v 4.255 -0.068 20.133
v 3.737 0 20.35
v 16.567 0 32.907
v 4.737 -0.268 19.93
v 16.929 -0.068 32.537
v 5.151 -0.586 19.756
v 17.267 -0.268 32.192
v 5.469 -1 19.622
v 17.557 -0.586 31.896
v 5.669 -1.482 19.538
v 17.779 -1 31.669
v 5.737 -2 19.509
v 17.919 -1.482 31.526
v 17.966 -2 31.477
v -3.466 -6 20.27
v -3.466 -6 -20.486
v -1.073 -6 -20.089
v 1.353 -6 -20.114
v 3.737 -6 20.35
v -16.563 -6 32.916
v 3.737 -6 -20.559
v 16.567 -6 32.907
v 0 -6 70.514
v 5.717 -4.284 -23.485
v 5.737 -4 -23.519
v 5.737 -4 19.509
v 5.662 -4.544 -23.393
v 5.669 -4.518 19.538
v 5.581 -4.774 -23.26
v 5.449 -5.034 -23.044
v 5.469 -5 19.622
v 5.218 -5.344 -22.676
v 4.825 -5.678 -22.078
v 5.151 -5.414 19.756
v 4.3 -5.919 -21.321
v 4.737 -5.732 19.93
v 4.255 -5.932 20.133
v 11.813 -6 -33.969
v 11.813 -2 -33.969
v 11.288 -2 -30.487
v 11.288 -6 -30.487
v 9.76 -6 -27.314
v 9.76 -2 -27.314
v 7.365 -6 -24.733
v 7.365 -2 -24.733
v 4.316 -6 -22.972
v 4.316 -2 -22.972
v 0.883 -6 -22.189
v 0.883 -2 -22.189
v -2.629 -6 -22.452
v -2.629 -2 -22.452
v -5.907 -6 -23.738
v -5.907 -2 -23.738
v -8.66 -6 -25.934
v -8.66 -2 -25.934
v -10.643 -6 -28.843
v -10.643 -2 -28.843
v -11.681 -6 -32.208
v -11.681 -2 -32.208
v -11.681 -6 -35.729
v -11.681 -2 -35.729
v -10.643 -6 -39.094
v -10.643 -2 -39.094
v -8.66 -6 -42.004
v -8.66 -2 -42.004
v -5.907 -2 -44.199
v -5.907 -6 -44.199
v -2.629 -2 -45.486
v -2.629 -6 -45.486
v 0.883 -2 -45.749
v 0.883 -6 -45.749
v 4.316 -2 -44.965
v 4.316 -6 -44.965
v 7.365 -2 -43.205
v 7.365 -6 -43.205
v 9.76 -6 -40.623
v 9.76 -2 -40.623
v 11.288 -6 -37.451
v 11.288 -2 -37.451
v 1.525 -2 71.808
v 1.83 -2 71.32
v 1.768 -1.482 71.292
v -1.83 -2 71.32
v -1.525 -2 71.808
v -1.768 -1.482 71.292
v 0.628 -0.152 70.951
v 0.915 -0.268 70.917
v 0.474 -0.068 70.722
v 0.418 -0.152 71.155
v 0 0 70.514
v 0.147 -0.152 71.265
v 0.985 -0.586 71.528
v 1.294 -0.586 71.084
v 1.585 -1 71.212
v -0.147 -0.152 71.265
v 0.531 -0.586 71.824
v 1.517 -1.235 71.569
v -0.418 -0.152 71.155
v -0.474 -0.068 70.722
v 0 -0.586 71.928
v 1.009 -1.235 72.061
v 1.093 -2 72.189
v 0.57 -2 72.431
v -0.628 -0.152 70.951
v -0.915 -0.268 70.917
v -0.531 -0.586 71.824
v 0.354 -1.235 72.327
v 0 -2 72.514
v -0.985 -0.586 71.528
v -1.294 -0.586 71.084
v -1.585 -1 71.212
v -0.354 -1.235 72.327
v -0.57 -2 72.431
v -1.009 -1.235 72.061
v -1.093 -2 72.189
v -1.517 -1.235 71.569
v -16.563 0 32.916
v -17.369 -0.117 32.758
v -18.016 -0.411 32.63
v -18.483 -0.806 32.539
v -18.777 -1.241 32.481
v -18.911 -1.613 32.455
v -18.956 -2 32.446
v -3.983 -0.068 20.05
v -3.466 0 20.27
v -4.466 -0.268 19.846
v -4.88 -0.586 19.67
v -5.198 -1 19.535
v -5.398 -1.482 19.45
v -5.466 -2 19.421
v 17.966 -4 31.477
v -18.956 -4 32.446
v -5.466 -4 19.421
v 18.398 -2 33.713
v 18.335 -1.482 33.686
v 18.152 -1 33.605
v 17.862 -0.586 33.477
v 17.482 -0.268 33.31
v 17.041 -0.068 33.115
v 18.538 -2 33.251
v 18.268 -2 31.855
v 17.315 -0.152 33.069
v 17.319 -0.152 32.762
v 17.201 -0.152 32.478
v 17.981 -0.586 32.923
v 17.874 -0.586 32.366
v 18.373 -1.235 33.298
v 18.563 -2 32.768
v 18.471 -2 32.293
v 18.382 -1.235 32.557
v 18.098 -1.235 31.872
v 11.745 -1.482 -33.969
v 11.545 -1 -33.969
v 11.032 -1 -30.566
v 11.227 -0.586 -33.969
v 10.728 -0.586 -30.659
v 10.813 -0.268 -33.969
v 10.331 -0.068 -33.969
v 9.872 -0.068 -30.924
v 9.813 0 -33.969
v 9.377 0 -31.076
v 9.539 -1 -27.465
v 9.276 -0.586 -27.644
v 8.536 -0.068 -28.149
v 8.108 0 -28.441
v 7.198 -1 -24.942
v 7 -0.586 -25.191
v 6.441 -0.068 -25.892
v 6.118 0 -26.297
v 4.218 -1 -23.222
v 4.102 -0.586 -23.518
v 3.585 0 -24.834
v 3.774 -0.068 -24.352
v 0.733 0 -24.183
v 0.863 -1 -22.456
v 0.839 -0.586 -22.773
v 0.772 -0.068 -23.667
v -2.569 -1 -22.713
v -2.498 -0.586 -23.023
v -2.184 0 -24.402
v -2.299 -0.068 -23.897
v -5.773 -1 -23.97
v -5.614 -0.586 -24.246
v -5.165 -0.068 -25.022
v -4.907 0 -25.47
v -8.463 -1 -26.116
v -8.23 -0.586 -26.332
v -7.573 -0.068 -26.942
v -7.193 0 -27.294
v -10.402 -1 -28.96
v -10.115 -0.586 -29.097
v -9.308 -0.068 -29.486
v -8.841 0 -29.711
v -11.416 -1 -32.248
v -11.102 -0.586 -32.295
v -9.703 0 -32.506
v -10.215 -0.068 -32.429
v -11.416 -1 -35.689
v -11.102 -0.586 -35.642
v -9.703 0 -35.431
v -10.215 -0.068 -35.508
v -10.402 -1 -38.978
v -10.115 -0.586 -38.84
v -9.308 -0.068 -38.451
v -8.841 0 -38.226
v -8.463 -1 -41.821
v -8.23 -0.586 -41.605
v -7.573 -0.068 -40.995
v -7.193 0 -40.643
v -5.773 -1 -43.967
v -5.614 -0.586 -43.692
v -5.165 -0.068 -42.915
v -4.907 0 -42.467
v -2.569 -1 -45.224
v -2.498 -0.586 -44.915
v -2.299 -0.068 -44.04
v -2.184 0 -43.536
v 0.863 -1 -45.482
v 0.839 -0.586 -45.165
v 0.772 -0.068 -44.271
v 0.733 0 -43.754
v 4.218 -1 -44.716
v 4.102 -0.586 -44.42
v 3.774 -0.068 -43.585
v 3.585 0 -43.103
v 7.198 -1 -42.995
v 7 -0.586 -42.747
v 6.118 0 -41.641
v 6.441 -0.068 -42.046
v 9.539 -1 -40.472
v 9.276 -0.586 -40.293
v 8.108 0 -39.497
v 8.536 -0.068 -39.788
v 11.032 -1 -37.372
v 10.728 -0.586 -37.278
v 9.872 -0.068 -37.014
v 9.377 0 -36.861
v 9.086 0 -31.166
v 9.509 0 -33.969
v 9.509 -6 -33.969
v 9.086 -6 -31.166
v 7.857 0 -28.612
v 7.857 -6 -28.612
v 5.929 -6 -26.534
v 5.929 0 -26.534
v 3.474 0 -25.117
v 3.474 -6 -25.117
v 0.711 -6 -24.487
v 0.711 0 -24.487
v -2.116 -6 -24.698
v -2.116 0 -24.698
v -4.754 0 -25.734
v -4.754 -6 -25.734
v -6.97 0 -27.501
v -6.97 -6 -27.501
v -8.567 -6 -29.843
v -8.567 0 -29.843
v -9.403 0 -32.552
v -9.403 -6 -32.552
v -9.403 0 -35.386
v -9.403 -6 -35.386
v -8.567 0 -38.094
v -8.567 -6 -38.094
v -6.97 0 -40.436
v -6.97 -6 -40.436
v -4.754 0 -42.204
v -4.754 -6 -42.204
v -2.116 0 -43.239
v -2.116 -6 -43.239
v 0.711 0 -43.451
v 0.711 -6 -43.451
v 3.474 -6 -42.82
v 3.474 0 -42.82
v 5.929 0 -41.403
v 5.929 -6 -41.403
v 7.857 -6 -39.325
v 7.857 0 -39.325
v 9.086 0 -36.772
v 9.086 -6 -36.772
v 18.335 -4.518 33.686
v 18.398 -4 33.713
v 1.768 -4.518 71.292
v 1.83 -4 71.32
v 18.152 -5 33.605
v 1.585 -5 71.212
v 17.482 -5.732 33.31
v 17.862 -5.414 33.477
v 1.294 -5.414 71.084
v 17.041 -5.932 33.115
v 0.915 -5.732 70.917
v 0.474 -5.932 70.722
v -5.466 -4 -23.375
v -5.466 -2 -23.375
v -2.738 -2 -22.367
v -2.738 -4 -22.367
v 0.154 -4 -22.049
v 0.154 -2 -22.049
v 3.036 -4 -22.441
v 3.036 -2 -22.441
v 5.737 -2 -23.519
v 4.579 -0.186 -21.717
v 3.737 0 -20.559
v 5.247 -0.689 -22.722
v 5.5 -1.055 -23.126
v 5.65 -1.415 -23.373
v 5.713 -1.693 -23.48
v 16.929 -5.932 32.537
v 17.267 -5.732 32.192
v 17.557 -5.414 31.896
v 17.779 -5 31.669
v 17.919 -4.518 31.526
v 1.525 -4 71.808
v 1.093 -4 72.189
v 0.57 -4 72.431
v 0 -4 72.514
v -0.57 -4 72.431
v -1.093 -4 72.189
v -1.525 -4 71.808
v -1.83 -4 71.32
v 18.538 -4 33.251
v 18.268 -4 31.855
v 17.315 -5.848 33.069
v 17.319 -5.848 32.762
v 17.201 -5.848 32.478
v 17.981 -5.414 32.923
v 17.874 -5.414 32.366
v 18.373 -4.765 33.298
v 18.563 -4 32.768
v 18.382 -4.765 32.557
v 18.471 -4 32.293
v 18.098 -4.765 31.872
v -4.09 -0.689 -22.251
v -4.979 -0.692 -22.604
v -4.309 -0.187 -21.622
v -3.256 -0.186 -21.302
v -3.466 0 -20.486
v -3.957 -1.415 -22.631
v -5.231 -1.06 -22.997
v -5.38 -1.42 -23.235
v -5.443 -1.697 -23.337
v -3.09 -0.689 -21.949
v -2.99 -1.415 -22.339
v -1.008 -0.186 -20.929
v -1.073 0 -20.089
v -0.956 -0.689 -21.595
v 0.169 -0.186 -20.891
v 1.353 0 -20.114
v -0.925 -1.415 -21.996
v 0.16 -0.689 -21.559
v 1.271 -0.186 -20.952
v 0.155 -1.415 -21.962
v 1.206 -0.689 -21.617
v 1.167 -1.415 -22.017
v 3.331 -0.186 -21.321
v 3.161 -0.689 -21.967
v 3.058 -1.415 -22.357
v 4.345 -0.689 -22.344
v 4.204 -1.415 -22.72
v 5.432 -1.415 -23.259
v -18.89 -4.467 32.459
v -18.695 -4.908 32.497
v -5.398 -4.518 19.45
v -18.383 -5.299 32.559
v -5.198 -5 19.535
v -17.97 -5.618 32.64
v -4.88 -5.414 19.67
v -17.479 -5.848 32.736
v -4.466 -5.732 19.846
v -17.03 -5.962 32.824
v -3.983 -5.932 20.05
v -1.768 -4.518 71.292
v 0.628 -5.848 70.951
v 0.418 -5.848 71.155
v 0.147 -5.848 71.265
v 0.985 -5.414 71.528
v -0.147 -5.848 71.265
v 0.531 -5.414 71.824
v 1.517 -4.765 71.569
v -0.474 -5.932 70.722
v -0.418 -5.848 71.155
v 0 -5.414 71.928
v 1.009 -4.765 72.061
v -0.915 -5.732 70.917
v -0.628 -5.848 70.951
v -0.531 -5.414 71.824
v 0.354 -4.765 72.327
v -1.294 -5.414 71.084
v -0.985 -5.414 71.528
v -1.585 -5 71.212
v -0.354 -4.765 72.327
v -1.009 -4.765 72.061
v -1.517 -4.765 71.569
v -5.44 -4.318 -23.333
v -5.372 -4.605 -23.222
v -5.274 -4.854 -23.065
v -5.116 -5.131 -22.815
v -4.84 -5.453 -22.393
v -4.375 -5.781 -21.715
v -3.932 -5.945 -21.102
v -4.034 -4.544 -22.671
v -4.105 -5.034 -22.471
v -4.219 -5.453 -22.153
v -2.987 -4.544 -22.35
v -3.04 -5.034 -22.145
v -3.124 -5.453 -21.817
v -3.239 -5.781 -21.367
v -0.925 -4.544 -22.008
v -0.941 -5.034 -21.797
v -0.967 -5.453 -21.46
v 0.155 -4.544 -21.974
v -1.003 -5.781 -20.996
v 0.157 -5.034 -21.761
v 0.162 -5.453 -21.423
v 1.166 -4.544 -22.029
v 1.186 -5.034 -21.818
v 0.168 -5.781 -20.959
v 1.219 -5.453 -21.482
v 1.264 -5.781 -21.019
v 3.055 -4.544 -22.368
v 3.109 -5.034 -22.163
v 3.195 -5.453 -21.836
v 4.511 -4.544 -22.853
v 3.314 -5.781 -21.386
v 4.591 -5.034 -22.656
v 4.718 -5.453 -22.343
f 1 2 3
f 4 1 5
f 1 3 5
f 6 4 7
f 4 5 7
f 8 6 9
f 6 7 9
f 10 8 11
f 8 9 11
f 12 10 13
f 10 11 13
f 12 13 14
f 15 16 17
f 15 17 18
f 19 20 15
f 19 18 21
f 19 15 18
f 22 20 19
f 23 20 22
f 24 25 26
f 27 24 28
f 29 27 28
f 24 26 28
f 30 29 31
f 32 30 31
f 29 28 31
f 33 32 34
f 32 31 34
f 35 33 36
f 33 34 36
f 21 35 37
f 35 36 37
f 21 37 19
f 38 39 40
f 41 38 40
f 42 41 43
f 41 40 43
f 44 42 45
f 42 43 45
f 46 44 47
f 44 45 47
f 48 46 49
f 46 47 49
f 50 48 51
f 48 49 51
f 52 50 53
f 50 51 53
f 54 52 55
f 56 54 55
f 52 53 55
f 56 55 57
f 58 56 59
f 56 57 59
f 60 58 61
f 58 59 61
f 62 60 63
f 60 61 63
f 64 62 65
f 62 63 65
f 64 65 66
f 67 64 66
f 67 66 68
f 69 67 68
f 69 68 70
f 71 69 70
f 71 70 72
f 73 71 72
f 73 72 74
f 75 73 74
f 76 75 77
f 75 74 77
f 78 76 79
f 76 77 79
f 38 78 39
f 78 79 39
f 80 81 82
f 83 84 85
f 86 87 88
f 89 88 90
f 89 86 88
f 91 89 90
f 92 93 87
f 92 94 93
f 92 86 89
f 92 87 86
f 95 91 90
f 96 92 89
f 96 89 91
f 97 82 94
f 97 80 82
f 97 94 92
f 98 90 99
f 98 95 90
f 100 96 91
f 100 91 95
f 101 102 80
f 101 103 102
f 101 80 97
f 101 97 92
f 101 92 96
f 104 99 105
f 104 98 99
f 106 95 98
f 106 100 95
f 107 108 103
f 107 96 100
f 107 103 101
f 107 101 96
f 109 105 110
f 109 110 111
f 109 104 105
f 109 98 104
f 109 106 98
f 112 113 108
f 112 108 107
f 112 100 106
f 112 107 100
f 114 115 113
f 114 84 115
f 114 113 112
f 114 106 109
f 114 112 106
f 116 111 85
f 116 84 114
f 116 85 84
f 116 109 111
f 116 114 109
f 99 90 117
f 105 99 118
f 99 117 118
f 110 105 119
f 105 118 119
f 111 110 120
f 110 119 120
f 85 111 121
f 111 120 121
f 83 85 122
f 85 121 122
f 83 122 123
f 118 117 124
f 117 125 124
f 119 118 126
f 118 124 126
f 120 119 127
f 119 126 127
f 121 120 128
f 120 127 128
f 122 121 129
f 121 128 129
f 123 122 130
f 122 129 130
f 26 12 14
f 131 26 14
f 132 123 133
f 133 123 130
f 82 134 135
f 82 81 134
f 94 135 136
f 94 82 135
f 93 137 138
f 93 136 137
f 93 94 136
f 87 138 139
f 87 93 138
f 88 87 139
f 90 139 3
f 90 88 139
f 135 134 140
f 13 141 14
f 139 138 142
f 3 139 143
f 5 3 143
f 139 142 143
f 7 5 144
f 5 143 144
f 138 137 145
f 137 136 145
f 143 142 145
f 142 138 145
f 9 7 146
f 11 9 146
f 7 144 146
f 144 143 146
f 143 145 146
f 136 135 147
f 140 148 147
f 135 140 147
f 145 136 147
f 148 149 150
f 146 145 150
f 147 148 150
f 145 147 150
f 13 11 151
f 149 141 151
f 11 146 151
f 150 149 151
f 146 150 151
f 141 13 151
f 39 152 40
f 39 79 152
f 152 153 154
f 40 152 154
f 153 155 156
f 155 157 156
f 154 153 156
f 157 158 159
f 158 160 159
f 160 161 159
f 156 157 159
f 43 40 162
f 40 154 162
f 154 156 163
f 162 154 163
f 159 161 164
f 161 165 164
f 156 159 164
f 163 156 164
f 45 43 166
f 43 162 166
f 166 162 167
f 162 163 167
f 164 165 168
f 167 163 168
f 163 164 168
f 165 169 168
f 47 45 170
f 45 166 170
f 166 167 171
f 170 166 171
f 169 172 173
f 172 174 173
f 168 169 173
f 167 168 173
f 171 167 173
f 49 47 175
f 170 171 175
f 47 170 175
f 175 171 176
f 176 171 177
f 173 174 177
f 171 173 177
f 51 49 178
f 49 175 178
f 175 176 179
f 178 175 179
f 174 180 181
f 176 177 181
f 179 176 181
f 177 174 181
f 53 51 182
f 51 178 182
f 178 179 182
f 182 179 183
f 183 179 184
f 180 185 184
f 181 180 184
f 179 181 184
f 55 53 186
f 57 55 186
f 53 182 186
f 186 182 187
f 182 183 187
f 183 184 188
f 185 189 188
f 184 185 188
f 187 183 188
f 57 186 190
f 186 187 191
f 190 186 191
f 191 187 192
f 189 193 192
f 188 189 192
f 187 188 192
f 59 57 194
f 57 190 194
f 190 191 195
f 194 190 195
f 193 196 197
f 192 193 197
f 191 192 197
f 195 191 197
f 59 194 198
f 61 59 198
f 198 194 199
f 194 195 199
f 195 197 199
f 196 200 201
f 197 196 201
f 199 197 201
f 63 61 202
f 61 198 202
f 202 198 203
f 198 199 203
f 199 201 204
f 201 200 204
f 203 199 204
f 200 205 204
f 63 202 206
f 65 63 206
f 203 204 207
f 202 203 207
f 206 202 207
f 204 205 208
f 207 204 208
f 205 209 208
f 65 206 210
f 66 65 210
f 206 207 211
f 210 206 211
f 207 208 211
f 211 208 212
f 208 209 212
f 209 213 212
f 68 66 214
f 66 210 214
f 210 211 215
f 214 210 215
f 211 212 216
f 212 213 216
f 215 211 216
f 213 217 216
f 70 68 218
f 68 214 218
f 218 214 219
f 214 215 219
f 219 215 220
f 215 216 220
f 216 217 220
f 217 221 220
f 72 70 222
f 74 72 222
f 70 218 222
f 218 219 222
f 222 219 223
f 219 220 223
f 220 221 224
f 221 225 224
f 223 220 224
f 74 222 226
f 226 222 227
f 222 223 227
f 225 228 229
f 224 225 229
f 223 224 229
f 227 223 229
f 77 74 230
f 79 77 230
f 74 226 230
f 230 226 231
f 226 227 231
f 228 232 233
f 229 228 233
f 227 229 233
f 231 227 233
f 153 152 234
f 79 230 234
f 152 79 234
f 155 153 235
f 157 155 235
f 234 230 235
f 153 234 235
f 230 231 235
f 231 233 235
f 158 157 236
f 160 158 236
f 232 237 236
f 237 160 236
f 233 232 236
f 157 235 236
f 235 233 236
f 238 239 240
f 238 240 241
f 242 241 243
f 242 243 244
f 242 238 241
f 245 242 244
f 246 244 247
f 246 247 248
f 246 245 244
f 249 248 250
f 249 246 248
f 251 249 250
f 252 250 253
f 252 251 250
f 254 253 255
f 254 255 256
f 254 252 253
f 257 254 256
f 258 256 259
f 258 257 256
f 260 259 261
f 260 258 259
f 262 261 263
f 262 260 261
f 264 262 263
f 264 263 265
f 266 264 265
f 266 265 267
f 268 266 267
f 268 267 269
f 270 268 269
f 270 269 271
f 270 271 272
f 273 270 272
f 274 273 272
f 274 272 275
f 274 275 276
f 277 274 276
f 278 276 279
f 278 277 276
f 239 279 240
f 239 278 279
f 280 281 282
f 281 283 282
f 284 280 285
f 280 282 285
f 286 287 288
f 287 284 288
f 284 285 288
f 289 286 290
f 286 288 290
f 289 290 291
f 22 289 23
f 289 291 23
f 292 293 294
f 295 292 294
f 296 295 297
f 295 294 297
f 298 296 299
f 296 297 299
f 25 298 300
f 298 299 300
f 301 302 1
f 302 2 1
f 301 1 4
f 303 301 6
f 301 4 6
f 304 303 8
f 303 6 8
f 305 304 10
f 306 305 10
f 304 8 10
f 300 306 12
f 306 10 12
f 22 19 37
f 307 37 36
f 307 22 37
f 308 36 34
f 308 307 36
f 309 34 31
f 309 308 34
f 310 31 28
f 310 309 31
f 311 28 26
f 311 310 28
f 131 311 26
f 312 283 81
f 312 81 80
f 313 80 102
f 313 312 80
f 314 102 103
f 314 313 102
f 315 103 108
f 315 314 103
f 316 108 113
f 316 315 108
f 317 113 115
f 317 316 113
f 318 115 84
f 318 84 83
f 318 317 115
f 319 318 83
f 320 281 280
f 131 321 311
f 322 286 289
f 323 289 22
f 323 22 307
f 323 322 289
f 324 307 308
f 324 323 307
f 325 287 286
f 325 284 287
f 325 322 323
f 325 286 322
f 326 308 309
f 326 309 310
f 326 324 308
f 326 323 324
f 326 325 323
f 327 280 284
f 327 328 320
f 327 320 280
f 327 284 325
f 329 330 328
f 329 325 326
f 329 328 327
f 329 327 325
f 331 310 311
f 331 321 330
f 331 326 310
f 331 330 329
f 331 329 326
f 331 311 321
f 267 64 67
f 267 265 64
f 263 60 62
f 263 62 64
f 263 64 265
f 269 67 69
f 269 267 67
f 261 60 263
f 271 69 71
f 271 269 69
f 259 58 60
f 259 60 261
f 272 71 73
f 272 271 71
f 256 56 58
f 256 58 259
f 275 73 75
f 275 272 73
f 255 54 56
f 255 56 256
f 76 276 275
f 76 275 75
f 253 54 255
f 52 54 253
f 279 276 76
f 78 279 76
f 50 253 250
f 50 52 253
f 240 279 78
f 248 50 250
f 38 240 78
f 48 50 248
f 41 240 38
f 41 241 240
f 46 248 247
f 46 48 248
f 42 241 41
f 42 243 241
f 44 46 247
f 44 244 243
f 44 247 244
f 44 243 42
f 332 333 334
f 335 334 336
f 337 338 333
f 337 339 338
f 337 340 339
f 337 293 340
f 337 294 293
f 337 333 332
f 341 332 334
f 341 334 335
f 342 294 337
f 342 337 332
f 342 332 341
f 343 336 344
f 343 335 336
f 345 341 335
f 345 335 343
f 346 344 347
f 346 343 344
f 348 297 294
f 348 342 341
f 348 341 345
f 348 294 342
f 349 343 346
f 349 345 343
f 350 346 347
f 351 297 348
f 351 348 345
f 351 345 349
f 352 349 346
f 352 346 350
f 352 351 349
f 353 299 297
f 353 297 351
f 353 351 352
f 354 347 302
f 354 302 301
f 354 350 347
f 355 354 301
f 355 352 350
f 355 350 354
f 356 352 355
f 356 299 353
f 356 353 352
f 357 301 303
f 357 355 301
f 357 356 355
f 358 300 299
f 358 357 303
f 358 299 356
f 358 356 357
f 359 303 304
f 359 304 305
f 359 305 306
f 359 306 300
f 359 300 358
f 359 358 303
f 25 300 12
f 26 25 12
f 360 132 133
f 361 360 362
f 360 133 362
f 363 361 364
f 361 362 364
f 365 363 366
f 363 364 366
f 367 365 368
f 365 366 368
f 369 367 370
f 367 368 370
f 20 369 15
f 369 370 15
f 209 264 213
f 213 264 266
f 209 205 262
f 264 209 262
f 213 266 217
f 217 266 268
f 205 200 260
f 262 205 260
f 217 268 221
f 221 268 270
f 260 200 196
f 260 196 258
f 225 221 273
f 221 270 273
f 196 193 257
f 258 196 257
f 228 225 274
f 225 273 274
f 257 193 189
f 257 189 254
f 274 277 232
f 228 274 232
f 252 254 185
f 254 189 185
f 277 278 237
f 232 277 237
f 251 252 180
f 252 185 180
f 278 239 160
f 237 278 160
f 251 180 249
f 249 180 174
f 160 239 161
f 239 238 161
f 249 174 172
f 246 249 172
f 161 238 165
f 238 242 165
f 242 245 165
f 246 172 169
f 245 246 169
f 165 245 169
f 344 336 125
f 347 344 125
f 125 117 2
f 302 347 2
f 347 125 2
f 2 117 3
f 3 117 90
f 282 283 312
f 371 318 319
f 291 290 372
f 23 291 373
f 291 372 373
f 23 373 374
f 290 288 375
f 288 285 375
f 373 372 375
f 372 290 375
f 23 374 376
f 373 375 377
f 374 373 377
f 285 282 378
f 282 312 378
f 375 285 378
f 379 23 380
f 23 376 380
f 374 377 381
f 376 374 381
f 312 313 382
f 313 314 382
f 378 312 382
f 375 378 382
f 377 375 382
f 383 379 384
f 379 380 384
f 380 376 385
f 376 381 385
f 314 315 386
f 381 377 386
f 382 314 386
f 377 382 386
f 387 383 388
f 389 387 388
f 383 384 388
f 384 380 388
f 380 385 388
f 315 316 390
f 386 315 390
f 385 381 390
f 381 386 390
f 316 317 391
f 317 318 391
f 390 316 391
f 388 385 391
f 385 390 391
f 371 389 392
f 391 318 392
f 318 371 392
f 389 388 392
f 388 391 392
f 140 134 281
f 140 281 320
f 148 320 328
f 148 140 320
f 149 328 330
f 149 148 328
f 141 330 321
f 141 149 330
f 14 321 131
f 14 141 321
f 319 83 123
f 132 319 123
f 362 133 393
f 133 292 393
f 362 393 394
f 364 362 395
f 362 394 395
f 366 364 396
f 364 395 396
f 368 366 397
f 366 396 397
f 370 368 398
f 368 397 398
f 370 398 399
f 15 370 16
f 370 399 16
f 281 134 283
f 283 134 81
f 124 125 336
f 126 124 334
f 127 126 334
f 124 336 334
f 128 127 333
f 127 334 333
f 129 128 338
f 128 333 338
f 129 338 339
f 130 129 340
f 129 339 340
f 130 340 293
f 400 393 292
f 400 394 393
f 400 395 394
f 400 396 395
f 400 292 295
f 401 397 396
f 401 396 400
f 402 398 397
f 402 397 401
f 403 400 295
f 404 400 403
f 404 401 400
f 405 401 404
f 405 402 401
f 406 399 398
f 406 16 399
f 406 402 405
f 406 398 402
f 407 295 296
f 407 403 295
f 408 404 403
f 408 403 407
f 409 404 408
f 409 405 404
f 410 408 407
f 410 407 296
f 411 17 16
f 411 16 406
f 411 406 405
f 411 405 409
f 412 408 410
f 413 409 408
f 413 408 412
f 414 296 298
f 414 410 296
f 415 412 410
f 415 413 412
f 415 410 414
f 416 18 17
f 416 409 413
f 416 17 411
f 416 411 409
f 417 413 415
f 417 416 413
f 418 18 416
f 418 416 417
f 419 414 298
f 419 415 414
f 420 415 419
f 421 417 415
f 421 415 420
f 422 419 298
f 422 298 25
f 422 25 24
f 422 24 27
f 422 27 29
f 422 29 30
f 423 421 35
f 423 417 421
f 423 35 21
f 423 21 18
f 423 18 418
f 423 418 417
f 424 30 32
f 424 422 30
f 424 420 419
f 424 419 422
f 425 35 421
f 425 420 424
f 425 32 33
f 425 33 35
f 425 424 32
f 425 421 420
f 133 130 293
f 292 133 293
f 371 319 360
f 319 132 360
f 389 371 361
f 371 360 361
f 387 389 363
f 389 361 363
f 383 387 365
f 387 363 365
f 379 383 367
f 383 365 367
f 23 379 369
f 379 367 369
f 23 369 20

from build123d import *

# Parameters (mm, degrees)
F1_DEPTH = 5
F2_DEPTH = 6
F0_R     = 11.813064162
F0_R_2   = 9.5088348367
F3_R     = 2
F3_2_R   = 2


# Not quite as in the source:
# - a feature of the source that left no trace in its solid (it failed there, or was rolled back) is left out


with BuildPart() as f1:
    # F0 (on Front) → F1 (new body)
    with BuildSketch(Plane.XZ):
        with BuildLine():
            Line((18.9558565617, 32.4459187686), (0, 75.4745528102))
            Line((0, 75.4745528102), (-18.9558584243, 32.4459187686))
            Line((-18.9558584243, 32.4459187686), (-5.4657990113, 19.4210316986))
            Line((-5.4657990113, 19.4210316986), (-5.4657990113, 0))
            Line((-5.4657990113, 0), (-5.4657990113, -23.3750138432))
            ThreePointArc((-5.4657990113, -23.3750138432), (0.1536859635, -22.0490794669), (5.7371167932, -23.5194581672))
            Line((5.7371167932, -23.5194581672), (5.7371167932, 0.0881423131))
            Line((5.7371167932, 0.0881423131), (5.7371167932, 19.5091740117))
            Line((5.7371167932, 19.5091740117), (18.9558565617, 32.4459187686))
        make_face()
    extrude(amount=F1_DEPTH)

    # F0 (on Front) → F2 (join)
    with BuildSketch(Plane.XZ):
        with BuildLine():
            Line((18.9558565617, 32.4459187686), (0, 75.4745528102))
            Line((0, 75.4745528102), (-18.9558584243, 32.4459187686))
            Line((-18.9558584243, 32.4459187686), (-5.4657990113, 19.4210316986))
            Line((-5.4657990113, 19.4210316986), (-5.4657990113, 0))
            Line((-5.4657990113, 0), (-5.4657990113, -23.3750138432))
            ThreePointArc((-5.4657990113, -23.3750138432), (0.1536859635, -22.0490794669), (5.7371167932, -23.5194581672))
            Line((5.7371167932, -23.5194581672), (5.7371167932, 0.0881423131))
            Line((5.7371167932, 0.0881423131), (5.7371167932, 19.5091740117))
            Line((5.7371167932, 19.5091740117), (18.9558565617, 32.4459187686))
        make_face()
    extrude(amount=F2_DEPTH)

    # F3
    f3_edges = [f1.edges().sort_by_distance(p)[0] for p in [
        (9.477928, -6, 53.960236),
        (-9.477929, -6, 53.960236),
        (-12.210829, -6, 25.933475),
        (-5.465799, -6, -1.976991),
        (0.153686, -6, -22.049079),
        (5.737117, -6, -2.005142),
        (12.346487, -6, 25.977546),
        (18.955857, -3, 32.445919),
        (0, -3, 75.474553),
        (9.477928, 0, 53.960236),
        (12.346487, 0, 25.977546),
        (-12.210829, 0, 25.933475),
        (-5.465799, 0, -1.976991),
        (5.737117, 0, -2.005142),
        (-9.477929, 0, 53.960236),
        (0.153686, 0, -22.049079),
    ]]
    fillet(f3_edges, radius=F3_R)


with BuildPart() as f2:
    # F0 (on Front) → F2, piece 2 (new body)
    with BuildSketch(Plane.XZ):
        with Locations((0, -33.9687649328)):
            Circle(F0_R)
        with Locations((0, -33.9687649328)):
            Circle(F0_R_2, mode=Mode.SUBTRACT)
    extrude(amount=F2_DEPTH)

    # F3#2
    f3_2_edges = [f2.edges().sort_by_distance(p)[0] for p in [
        (-11.813064, 0, -33.968765),
    ]]
    fillet(f3_2_edges, radius=F3_2_R)


solid = Compound([f1.part, f2.part])
